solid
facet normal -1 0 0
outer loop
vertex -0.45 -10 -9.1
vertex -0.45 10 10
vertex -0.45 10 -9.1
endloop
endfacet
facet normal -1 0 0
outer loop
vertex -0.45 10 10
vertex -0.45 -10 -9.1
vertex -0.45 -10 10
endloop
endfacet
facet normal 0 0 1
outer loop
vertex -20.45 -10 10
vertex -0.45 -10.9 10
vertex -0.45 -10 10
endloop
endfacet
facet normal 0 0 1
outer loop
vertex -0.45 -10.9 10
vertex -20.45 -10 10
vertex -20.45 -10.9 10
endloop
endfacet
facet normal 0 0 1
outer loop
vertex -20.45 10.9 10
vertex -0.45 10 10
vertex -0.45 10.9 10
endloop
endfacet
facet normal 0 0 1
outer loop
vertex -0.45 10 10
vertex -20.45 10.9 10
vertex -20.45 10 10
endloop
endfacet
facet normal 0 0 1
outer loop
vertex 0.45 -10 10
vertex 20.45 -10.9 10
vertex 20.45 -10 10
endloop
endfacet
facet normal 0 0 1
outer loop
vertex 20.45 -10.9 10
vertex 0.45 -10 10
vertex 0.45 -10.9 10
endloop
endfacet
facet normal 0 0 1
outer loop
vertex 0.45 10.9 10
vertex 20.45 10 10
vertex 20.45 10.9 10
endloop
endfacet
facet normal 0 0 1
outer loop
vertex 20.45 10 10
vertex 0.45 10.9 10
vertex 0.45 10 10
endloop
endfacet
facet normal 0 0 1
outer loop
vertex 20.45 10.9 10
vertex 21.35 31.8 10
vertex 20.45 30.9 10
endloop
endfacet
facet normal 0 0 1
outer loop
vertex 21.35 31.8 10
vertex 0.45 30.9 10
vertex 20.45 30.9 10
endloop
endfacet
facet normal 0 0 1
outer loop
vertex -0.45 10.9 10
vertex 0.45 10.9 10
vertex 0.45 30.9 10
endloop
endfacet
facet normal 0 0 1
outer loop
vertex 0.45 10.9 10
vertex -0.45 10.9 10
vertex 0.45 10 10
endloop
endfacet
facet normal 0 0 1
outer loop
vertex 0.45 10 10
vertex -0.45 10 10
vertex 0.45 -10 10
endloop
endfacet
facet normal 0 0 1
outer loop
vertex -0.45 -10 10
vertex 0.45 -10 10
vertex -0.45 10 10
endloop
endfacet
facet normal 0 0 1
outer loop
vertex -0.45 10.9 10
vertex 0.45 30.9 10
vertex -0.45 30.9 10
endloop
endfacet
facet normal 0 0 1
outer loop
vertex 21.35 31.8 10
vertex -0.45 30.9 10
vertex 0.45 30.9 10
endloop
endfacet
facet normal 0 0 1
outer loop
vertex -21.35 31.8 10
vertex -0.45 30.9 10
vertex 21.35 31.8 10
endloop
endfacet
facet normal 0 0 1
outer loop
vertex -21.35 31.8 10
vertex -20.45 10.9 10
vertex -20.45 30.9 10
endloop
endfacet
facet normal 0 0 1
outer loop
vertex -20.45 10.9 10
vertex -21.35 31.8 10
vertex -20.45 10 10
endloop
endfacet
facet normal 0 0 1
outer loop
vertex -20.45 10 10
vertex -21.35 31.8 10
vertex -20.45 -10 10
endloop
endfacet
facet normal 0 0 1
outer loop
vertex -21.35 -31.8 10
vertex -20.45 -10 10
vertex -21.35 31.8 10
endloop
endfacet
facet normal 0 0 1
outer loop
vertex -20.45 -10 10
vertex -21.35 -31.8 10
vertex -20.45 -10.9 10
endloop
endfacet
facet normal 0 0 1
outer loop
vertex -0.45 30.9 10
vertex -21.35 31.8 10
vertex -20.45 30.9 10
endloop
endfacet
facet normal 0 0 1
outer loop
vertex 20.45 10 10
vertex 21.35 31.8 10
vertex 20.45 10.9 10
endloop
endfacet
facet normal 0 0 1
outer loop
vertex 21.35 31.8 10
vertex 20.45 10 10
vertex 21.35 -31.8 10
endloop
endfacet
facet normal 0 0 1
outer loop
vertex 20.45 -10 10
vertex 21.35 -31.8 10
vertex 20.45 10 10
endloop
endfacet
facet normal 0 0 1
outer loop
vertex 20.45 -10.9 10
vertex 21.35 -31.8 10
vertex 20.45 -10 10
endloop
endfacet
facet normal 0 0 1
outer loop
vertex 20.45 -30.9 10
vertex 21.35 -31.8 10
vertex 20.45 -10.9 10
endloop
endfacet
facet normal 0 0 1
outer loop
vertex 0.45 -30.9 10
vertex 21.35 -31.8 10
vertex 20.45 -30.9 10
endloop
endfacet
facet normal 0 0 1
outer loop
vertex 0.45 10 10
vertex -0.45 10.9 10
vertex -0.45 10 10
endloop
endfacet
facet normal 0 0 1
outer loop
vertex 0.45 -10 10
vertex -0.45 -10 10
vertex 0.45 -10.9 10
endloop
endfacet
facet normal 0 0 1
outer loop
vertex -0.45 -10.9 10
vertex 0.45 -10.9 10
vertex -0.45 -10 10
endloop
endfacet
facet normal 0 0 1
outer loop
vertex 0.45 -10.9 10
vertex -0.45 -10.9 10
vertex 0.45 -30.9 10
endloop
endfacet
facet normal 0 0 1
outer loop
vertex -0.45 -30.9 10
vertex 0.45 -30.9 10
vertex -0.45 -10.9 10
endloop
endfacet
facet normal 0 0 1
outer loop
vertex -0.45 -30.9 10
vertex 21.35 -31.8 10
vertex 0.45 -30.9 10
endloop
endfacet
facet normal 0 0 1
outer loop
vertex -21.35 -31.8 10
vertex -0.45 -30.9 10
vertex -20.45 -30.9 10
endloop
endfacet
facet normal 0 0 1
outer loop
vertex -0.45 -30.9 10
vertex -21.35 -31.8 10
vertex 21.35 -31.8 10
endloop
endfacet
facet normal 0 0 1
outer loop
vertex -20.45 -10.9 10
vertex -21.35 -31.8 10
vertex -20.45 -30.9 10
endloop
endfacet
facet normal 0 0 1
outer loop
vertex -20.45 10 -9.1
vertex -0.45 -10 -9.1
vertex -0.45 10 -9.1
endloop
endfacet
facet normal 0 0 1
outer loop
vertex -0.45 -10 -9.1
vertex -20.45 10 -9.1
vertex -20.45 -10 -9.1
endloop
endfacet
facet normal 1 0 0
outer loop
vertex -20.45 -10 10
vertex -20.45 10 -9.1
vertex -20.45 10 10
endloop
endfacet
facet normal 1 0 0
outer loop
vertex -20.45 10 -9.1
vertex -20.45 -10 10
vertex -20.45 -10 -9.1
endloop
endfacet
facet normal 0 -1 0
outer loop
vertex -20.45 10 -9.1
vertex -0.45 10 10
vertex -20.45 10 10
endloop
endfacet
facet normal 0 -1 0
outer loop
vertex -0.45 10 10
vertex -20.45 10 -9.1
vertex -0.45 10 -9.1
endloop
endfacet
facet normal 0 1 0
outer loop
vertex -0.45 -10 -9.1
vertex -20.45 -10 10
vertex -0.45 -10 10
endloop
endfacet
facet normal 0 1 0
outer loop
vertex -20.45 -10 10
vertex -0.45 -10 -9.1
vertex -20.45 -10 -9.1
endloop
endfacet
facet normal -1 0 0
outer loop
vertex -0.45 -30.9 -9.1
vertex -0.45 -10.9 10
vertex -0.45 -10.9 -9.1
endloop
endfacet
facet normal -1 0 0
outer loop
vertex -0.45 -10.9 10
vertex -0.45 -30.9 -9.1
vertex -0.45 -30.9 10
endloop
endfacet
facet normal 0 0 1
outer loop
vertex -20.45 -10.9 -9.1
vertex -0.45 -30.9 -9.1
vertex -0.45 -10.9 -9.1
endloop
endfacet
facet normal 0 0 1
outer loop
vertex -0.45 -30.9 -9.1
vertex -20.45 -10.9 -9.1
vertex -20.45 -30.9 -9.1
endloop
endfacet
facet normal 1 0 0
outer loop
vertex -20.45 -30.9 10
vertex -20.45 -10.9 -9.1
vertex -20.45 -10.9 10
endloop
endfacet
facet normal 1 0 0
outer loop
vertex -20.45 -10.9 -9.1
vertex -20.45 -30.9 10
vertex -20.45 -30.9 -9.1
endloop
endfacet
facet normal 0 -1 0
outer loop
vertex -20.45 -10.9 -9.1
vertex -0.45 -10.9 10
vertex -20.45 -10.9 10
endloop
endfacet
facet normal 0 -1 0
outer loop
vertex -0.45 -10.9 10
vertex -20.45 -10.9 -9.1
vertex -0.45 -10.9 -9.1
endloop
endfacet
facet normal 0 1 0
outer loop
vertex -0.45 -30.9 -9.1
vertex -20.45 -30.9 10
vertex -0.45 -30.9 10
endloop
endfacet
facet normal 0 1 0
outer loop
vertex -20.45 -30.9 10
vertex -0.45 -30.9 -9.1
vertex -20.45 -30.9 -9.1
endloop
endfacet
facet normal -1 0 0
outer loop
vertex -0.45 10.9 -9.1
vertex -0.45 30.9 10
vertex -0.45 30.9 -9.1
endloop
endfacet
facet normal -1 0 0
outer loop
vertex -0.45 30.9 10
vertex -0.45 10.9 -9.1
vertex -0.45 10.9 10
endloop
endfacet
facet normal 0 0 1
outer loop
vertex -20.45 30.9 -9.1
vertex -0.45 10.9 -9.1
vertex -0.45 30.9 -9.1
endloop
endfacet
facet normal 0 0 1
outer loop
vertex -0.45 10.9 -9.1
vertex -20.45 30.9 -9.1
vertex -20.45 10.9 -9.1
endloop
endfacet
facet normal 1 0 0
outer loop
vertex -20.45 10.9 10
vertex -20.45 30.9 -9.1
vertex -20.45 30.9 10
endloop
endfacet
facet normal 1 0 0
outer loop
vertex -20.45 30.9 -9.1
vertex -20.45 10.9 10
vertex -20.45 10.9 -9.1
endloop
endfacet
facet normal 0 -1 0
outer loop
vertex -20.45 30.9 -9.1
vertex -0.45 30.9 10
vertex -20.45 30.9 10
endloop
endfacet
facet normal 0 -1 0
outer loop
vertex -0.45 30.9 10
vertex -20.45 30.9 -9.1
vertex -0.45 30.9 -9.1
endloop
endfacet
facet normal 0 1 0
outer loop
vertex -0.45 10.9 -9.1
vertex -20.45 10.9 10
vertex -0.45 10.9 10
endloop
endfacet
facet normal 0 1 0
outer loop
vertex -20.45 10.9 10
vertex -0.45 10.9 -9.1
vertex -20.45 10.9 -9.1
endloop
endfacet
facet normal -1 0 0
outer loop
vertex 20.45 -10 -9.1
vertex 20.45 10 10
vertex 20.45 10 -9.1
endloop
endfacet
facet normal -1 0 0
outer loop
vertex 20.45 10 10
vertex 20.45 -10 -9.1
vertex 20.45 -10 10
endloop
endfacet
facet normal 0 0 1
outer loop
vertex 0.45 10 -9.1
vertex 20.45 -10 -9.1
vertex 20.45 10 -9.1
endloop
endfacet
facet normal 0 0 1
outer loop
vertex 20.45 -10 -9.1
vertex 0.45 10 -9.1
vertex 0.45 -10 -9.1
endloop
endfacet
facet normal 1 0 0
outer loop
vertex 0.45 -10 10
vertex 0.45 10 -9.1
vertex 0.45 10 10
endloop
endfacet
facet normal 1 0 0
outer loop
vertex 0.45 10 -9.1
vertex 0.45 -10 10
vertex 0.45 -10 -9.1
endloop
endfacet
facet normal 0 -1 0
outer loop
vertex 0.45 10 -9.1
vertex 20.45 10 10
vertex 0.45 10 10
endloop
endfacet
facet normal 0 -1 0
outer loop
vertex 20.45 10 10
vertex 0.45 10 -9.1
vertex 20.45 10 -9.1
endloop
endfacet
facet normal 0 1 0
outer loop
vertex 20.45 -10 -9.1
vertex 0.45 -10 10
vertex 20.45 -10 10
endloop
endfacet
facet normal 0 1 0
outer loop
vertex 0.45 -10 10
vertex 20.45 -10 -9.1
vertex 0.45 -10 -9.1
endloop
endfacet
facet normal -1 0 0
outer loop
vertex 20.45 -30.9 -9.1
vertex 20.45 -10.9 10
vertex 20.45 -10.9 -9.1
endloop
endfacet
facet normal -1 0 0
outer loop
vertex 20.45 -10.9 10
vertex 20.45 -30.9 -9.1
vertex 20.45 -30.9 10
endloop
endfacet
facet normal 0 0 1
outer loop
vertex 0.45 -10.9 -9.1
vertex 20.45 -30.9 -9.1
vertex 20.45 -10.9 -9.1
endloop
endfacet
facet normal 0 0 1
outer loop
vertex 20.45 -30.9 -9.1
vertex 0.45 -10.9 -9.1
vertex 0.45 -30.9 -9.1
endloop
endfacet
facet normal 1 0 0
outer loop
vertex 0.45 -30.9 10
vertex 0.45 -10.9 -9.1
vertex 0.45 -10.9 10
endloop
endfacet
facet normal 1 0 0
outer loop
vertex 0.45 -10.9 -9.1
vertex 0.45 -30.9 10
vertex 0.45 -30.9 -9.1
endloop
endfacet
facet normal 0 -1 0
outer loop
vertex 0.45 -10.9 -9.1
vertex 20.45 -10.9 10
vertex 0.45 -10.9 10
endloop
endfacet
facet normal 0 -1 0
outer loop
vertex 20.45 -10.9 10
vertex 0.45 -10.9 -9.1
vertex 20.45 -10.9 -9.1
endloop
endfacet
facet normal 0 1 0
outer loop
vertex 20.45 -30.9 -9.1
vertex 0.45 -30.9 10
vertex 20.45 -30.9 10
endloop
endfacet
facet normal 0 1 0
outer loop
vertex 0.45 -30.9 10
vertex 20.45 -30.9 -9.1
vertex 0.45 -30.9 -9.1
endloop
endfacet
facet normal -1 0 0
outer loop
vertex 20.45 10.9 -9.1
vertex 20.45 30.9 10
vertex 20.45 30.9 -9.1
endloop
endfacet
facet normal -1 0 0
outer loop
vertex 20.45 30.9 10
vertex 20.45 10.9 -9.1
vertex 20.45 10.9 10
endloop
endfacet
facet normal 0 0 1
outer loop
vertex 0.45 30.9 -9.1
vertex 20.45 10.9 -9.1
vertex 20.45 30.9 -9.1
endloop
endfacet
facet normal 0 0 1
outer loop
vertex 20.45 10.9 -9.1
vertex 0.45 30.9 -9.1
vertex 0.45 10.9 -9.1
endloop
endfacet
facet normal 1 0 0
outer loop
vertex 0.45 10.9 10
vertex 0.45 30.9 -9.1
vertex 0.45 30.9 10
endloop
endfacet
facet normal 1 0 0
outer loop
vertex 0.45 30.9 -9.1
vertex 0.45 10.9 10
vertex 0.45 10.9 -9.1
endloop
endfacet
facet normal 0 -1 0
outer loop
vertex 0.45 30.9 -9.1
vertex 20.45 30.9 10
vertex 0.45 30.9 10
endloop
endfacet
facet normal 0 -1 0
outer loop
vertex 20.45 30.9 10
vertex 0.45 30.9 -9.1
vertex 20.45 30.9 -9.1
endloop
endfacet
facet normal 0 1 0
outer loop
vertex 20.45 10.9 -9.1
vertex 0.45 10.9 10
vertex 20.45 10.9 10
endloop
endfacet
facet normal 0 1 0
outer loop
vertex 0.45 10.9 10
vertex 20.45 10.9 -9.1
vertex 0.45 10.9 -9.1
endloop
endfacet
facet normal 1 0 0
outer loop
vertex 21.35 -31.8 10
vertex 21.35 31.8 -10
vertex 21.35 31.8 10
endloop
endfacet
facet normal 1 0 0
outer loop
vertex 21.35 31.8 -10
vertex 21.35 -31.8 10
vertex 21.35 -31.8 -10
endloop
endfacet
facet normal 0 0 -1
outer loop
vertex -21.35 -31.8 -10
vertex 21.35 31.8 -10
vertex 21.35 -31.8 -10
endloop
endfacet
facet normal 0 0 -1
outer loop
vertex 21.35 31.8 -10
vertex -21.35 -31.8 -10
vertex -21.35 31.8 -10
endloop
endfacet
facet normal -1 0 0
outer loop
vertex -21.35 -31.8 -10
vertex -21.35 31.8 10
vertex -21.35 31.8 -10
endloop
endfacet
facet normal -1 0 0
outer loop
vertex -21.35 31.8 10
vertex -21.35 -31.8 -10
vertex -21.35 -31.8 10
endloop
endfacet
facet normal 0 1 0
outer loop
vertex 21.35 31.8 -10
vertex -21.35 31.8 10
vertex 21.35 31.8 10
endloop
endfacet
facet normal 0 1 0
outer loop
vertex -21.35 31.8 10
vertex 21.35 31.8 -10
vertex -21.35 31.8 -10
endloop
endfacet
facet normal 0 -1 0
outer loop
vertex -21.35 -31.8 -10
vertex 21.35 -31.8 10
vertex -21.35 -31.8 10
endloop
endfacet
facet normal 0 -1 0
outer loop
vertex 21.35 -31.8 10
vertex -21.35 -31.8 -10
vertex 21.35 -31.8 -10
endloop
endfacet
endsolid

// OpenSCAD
difference() {
  scale([42.7000000000, 63.6000000000, 20.0000000000]) {
    translate([-0.5000000000, -0.5000000000, -0.5000000000]) {
      cube([1, 1, 1]);
    }
  }
  union() {
    union() {
      union() {
        union() {
          union() {
            translate([-10.4500000000, 0.0000000000, 0.4500000000]) {
              scale([20.0000000000, 20.0000000000, 19.1000000000]) {
                translate([-0.5000000000, -0.5000000000, -0.5000000000]) {
                  cube([1, 1, 1]);
                }
              }
            }
            translate([-10.4500000000, -20.9000000000, 0.4500000000]) {
              scale([20.0000000000, 20.0000000000, 19.1000000000]) {
                translate([-0.5000000000, -0.5000000000, -0.5000000000]) {
                  cube([1, 1, 1]);
                }
              }
            }
          }
          translate([-10.4500000000, 20.9000000000, 0.4500000000]) {
            scale([20.0000000000, 20.0000000000, 19.1000000000]) {
              translate([-0.5000000000, -0.5000000000, -0.5000000000]) {
                cube([1, 1, 1]);
              }
            }
          }
        }
        translate([10.4500000000, 0.0000000000, 0.4500000000]) {
          scale([20.0000000000, 20.0000000000, 19.1000000000]) {
            translate([-0.5000000000, -0.5000000000, -0.5000000000]) {
              cube([1, 1, 1]);
            }
          }
        }
      }
      translate([10.4500000000, -20.9000000000, 0.4500000000]) {
        scale([20.0000000000, 20.0000000000, 19.1000000000]) {
          translate([-0.5000000000, -0.5000000000, -0.5000000000]) {
            cube([1, 1, 1]);
          }
        }
      }
    }
    translate([10.4500000000, 20.9000000000, 0.4500000000]) {
      scale([20.0000000000, 20.0000000000, 19.1000000000]) {
        translate([-0.5000000000, -0.5000000000, -0.5000000000]) {
          cube([1, 1, 1]);
        }
      }
    }
  }
}
